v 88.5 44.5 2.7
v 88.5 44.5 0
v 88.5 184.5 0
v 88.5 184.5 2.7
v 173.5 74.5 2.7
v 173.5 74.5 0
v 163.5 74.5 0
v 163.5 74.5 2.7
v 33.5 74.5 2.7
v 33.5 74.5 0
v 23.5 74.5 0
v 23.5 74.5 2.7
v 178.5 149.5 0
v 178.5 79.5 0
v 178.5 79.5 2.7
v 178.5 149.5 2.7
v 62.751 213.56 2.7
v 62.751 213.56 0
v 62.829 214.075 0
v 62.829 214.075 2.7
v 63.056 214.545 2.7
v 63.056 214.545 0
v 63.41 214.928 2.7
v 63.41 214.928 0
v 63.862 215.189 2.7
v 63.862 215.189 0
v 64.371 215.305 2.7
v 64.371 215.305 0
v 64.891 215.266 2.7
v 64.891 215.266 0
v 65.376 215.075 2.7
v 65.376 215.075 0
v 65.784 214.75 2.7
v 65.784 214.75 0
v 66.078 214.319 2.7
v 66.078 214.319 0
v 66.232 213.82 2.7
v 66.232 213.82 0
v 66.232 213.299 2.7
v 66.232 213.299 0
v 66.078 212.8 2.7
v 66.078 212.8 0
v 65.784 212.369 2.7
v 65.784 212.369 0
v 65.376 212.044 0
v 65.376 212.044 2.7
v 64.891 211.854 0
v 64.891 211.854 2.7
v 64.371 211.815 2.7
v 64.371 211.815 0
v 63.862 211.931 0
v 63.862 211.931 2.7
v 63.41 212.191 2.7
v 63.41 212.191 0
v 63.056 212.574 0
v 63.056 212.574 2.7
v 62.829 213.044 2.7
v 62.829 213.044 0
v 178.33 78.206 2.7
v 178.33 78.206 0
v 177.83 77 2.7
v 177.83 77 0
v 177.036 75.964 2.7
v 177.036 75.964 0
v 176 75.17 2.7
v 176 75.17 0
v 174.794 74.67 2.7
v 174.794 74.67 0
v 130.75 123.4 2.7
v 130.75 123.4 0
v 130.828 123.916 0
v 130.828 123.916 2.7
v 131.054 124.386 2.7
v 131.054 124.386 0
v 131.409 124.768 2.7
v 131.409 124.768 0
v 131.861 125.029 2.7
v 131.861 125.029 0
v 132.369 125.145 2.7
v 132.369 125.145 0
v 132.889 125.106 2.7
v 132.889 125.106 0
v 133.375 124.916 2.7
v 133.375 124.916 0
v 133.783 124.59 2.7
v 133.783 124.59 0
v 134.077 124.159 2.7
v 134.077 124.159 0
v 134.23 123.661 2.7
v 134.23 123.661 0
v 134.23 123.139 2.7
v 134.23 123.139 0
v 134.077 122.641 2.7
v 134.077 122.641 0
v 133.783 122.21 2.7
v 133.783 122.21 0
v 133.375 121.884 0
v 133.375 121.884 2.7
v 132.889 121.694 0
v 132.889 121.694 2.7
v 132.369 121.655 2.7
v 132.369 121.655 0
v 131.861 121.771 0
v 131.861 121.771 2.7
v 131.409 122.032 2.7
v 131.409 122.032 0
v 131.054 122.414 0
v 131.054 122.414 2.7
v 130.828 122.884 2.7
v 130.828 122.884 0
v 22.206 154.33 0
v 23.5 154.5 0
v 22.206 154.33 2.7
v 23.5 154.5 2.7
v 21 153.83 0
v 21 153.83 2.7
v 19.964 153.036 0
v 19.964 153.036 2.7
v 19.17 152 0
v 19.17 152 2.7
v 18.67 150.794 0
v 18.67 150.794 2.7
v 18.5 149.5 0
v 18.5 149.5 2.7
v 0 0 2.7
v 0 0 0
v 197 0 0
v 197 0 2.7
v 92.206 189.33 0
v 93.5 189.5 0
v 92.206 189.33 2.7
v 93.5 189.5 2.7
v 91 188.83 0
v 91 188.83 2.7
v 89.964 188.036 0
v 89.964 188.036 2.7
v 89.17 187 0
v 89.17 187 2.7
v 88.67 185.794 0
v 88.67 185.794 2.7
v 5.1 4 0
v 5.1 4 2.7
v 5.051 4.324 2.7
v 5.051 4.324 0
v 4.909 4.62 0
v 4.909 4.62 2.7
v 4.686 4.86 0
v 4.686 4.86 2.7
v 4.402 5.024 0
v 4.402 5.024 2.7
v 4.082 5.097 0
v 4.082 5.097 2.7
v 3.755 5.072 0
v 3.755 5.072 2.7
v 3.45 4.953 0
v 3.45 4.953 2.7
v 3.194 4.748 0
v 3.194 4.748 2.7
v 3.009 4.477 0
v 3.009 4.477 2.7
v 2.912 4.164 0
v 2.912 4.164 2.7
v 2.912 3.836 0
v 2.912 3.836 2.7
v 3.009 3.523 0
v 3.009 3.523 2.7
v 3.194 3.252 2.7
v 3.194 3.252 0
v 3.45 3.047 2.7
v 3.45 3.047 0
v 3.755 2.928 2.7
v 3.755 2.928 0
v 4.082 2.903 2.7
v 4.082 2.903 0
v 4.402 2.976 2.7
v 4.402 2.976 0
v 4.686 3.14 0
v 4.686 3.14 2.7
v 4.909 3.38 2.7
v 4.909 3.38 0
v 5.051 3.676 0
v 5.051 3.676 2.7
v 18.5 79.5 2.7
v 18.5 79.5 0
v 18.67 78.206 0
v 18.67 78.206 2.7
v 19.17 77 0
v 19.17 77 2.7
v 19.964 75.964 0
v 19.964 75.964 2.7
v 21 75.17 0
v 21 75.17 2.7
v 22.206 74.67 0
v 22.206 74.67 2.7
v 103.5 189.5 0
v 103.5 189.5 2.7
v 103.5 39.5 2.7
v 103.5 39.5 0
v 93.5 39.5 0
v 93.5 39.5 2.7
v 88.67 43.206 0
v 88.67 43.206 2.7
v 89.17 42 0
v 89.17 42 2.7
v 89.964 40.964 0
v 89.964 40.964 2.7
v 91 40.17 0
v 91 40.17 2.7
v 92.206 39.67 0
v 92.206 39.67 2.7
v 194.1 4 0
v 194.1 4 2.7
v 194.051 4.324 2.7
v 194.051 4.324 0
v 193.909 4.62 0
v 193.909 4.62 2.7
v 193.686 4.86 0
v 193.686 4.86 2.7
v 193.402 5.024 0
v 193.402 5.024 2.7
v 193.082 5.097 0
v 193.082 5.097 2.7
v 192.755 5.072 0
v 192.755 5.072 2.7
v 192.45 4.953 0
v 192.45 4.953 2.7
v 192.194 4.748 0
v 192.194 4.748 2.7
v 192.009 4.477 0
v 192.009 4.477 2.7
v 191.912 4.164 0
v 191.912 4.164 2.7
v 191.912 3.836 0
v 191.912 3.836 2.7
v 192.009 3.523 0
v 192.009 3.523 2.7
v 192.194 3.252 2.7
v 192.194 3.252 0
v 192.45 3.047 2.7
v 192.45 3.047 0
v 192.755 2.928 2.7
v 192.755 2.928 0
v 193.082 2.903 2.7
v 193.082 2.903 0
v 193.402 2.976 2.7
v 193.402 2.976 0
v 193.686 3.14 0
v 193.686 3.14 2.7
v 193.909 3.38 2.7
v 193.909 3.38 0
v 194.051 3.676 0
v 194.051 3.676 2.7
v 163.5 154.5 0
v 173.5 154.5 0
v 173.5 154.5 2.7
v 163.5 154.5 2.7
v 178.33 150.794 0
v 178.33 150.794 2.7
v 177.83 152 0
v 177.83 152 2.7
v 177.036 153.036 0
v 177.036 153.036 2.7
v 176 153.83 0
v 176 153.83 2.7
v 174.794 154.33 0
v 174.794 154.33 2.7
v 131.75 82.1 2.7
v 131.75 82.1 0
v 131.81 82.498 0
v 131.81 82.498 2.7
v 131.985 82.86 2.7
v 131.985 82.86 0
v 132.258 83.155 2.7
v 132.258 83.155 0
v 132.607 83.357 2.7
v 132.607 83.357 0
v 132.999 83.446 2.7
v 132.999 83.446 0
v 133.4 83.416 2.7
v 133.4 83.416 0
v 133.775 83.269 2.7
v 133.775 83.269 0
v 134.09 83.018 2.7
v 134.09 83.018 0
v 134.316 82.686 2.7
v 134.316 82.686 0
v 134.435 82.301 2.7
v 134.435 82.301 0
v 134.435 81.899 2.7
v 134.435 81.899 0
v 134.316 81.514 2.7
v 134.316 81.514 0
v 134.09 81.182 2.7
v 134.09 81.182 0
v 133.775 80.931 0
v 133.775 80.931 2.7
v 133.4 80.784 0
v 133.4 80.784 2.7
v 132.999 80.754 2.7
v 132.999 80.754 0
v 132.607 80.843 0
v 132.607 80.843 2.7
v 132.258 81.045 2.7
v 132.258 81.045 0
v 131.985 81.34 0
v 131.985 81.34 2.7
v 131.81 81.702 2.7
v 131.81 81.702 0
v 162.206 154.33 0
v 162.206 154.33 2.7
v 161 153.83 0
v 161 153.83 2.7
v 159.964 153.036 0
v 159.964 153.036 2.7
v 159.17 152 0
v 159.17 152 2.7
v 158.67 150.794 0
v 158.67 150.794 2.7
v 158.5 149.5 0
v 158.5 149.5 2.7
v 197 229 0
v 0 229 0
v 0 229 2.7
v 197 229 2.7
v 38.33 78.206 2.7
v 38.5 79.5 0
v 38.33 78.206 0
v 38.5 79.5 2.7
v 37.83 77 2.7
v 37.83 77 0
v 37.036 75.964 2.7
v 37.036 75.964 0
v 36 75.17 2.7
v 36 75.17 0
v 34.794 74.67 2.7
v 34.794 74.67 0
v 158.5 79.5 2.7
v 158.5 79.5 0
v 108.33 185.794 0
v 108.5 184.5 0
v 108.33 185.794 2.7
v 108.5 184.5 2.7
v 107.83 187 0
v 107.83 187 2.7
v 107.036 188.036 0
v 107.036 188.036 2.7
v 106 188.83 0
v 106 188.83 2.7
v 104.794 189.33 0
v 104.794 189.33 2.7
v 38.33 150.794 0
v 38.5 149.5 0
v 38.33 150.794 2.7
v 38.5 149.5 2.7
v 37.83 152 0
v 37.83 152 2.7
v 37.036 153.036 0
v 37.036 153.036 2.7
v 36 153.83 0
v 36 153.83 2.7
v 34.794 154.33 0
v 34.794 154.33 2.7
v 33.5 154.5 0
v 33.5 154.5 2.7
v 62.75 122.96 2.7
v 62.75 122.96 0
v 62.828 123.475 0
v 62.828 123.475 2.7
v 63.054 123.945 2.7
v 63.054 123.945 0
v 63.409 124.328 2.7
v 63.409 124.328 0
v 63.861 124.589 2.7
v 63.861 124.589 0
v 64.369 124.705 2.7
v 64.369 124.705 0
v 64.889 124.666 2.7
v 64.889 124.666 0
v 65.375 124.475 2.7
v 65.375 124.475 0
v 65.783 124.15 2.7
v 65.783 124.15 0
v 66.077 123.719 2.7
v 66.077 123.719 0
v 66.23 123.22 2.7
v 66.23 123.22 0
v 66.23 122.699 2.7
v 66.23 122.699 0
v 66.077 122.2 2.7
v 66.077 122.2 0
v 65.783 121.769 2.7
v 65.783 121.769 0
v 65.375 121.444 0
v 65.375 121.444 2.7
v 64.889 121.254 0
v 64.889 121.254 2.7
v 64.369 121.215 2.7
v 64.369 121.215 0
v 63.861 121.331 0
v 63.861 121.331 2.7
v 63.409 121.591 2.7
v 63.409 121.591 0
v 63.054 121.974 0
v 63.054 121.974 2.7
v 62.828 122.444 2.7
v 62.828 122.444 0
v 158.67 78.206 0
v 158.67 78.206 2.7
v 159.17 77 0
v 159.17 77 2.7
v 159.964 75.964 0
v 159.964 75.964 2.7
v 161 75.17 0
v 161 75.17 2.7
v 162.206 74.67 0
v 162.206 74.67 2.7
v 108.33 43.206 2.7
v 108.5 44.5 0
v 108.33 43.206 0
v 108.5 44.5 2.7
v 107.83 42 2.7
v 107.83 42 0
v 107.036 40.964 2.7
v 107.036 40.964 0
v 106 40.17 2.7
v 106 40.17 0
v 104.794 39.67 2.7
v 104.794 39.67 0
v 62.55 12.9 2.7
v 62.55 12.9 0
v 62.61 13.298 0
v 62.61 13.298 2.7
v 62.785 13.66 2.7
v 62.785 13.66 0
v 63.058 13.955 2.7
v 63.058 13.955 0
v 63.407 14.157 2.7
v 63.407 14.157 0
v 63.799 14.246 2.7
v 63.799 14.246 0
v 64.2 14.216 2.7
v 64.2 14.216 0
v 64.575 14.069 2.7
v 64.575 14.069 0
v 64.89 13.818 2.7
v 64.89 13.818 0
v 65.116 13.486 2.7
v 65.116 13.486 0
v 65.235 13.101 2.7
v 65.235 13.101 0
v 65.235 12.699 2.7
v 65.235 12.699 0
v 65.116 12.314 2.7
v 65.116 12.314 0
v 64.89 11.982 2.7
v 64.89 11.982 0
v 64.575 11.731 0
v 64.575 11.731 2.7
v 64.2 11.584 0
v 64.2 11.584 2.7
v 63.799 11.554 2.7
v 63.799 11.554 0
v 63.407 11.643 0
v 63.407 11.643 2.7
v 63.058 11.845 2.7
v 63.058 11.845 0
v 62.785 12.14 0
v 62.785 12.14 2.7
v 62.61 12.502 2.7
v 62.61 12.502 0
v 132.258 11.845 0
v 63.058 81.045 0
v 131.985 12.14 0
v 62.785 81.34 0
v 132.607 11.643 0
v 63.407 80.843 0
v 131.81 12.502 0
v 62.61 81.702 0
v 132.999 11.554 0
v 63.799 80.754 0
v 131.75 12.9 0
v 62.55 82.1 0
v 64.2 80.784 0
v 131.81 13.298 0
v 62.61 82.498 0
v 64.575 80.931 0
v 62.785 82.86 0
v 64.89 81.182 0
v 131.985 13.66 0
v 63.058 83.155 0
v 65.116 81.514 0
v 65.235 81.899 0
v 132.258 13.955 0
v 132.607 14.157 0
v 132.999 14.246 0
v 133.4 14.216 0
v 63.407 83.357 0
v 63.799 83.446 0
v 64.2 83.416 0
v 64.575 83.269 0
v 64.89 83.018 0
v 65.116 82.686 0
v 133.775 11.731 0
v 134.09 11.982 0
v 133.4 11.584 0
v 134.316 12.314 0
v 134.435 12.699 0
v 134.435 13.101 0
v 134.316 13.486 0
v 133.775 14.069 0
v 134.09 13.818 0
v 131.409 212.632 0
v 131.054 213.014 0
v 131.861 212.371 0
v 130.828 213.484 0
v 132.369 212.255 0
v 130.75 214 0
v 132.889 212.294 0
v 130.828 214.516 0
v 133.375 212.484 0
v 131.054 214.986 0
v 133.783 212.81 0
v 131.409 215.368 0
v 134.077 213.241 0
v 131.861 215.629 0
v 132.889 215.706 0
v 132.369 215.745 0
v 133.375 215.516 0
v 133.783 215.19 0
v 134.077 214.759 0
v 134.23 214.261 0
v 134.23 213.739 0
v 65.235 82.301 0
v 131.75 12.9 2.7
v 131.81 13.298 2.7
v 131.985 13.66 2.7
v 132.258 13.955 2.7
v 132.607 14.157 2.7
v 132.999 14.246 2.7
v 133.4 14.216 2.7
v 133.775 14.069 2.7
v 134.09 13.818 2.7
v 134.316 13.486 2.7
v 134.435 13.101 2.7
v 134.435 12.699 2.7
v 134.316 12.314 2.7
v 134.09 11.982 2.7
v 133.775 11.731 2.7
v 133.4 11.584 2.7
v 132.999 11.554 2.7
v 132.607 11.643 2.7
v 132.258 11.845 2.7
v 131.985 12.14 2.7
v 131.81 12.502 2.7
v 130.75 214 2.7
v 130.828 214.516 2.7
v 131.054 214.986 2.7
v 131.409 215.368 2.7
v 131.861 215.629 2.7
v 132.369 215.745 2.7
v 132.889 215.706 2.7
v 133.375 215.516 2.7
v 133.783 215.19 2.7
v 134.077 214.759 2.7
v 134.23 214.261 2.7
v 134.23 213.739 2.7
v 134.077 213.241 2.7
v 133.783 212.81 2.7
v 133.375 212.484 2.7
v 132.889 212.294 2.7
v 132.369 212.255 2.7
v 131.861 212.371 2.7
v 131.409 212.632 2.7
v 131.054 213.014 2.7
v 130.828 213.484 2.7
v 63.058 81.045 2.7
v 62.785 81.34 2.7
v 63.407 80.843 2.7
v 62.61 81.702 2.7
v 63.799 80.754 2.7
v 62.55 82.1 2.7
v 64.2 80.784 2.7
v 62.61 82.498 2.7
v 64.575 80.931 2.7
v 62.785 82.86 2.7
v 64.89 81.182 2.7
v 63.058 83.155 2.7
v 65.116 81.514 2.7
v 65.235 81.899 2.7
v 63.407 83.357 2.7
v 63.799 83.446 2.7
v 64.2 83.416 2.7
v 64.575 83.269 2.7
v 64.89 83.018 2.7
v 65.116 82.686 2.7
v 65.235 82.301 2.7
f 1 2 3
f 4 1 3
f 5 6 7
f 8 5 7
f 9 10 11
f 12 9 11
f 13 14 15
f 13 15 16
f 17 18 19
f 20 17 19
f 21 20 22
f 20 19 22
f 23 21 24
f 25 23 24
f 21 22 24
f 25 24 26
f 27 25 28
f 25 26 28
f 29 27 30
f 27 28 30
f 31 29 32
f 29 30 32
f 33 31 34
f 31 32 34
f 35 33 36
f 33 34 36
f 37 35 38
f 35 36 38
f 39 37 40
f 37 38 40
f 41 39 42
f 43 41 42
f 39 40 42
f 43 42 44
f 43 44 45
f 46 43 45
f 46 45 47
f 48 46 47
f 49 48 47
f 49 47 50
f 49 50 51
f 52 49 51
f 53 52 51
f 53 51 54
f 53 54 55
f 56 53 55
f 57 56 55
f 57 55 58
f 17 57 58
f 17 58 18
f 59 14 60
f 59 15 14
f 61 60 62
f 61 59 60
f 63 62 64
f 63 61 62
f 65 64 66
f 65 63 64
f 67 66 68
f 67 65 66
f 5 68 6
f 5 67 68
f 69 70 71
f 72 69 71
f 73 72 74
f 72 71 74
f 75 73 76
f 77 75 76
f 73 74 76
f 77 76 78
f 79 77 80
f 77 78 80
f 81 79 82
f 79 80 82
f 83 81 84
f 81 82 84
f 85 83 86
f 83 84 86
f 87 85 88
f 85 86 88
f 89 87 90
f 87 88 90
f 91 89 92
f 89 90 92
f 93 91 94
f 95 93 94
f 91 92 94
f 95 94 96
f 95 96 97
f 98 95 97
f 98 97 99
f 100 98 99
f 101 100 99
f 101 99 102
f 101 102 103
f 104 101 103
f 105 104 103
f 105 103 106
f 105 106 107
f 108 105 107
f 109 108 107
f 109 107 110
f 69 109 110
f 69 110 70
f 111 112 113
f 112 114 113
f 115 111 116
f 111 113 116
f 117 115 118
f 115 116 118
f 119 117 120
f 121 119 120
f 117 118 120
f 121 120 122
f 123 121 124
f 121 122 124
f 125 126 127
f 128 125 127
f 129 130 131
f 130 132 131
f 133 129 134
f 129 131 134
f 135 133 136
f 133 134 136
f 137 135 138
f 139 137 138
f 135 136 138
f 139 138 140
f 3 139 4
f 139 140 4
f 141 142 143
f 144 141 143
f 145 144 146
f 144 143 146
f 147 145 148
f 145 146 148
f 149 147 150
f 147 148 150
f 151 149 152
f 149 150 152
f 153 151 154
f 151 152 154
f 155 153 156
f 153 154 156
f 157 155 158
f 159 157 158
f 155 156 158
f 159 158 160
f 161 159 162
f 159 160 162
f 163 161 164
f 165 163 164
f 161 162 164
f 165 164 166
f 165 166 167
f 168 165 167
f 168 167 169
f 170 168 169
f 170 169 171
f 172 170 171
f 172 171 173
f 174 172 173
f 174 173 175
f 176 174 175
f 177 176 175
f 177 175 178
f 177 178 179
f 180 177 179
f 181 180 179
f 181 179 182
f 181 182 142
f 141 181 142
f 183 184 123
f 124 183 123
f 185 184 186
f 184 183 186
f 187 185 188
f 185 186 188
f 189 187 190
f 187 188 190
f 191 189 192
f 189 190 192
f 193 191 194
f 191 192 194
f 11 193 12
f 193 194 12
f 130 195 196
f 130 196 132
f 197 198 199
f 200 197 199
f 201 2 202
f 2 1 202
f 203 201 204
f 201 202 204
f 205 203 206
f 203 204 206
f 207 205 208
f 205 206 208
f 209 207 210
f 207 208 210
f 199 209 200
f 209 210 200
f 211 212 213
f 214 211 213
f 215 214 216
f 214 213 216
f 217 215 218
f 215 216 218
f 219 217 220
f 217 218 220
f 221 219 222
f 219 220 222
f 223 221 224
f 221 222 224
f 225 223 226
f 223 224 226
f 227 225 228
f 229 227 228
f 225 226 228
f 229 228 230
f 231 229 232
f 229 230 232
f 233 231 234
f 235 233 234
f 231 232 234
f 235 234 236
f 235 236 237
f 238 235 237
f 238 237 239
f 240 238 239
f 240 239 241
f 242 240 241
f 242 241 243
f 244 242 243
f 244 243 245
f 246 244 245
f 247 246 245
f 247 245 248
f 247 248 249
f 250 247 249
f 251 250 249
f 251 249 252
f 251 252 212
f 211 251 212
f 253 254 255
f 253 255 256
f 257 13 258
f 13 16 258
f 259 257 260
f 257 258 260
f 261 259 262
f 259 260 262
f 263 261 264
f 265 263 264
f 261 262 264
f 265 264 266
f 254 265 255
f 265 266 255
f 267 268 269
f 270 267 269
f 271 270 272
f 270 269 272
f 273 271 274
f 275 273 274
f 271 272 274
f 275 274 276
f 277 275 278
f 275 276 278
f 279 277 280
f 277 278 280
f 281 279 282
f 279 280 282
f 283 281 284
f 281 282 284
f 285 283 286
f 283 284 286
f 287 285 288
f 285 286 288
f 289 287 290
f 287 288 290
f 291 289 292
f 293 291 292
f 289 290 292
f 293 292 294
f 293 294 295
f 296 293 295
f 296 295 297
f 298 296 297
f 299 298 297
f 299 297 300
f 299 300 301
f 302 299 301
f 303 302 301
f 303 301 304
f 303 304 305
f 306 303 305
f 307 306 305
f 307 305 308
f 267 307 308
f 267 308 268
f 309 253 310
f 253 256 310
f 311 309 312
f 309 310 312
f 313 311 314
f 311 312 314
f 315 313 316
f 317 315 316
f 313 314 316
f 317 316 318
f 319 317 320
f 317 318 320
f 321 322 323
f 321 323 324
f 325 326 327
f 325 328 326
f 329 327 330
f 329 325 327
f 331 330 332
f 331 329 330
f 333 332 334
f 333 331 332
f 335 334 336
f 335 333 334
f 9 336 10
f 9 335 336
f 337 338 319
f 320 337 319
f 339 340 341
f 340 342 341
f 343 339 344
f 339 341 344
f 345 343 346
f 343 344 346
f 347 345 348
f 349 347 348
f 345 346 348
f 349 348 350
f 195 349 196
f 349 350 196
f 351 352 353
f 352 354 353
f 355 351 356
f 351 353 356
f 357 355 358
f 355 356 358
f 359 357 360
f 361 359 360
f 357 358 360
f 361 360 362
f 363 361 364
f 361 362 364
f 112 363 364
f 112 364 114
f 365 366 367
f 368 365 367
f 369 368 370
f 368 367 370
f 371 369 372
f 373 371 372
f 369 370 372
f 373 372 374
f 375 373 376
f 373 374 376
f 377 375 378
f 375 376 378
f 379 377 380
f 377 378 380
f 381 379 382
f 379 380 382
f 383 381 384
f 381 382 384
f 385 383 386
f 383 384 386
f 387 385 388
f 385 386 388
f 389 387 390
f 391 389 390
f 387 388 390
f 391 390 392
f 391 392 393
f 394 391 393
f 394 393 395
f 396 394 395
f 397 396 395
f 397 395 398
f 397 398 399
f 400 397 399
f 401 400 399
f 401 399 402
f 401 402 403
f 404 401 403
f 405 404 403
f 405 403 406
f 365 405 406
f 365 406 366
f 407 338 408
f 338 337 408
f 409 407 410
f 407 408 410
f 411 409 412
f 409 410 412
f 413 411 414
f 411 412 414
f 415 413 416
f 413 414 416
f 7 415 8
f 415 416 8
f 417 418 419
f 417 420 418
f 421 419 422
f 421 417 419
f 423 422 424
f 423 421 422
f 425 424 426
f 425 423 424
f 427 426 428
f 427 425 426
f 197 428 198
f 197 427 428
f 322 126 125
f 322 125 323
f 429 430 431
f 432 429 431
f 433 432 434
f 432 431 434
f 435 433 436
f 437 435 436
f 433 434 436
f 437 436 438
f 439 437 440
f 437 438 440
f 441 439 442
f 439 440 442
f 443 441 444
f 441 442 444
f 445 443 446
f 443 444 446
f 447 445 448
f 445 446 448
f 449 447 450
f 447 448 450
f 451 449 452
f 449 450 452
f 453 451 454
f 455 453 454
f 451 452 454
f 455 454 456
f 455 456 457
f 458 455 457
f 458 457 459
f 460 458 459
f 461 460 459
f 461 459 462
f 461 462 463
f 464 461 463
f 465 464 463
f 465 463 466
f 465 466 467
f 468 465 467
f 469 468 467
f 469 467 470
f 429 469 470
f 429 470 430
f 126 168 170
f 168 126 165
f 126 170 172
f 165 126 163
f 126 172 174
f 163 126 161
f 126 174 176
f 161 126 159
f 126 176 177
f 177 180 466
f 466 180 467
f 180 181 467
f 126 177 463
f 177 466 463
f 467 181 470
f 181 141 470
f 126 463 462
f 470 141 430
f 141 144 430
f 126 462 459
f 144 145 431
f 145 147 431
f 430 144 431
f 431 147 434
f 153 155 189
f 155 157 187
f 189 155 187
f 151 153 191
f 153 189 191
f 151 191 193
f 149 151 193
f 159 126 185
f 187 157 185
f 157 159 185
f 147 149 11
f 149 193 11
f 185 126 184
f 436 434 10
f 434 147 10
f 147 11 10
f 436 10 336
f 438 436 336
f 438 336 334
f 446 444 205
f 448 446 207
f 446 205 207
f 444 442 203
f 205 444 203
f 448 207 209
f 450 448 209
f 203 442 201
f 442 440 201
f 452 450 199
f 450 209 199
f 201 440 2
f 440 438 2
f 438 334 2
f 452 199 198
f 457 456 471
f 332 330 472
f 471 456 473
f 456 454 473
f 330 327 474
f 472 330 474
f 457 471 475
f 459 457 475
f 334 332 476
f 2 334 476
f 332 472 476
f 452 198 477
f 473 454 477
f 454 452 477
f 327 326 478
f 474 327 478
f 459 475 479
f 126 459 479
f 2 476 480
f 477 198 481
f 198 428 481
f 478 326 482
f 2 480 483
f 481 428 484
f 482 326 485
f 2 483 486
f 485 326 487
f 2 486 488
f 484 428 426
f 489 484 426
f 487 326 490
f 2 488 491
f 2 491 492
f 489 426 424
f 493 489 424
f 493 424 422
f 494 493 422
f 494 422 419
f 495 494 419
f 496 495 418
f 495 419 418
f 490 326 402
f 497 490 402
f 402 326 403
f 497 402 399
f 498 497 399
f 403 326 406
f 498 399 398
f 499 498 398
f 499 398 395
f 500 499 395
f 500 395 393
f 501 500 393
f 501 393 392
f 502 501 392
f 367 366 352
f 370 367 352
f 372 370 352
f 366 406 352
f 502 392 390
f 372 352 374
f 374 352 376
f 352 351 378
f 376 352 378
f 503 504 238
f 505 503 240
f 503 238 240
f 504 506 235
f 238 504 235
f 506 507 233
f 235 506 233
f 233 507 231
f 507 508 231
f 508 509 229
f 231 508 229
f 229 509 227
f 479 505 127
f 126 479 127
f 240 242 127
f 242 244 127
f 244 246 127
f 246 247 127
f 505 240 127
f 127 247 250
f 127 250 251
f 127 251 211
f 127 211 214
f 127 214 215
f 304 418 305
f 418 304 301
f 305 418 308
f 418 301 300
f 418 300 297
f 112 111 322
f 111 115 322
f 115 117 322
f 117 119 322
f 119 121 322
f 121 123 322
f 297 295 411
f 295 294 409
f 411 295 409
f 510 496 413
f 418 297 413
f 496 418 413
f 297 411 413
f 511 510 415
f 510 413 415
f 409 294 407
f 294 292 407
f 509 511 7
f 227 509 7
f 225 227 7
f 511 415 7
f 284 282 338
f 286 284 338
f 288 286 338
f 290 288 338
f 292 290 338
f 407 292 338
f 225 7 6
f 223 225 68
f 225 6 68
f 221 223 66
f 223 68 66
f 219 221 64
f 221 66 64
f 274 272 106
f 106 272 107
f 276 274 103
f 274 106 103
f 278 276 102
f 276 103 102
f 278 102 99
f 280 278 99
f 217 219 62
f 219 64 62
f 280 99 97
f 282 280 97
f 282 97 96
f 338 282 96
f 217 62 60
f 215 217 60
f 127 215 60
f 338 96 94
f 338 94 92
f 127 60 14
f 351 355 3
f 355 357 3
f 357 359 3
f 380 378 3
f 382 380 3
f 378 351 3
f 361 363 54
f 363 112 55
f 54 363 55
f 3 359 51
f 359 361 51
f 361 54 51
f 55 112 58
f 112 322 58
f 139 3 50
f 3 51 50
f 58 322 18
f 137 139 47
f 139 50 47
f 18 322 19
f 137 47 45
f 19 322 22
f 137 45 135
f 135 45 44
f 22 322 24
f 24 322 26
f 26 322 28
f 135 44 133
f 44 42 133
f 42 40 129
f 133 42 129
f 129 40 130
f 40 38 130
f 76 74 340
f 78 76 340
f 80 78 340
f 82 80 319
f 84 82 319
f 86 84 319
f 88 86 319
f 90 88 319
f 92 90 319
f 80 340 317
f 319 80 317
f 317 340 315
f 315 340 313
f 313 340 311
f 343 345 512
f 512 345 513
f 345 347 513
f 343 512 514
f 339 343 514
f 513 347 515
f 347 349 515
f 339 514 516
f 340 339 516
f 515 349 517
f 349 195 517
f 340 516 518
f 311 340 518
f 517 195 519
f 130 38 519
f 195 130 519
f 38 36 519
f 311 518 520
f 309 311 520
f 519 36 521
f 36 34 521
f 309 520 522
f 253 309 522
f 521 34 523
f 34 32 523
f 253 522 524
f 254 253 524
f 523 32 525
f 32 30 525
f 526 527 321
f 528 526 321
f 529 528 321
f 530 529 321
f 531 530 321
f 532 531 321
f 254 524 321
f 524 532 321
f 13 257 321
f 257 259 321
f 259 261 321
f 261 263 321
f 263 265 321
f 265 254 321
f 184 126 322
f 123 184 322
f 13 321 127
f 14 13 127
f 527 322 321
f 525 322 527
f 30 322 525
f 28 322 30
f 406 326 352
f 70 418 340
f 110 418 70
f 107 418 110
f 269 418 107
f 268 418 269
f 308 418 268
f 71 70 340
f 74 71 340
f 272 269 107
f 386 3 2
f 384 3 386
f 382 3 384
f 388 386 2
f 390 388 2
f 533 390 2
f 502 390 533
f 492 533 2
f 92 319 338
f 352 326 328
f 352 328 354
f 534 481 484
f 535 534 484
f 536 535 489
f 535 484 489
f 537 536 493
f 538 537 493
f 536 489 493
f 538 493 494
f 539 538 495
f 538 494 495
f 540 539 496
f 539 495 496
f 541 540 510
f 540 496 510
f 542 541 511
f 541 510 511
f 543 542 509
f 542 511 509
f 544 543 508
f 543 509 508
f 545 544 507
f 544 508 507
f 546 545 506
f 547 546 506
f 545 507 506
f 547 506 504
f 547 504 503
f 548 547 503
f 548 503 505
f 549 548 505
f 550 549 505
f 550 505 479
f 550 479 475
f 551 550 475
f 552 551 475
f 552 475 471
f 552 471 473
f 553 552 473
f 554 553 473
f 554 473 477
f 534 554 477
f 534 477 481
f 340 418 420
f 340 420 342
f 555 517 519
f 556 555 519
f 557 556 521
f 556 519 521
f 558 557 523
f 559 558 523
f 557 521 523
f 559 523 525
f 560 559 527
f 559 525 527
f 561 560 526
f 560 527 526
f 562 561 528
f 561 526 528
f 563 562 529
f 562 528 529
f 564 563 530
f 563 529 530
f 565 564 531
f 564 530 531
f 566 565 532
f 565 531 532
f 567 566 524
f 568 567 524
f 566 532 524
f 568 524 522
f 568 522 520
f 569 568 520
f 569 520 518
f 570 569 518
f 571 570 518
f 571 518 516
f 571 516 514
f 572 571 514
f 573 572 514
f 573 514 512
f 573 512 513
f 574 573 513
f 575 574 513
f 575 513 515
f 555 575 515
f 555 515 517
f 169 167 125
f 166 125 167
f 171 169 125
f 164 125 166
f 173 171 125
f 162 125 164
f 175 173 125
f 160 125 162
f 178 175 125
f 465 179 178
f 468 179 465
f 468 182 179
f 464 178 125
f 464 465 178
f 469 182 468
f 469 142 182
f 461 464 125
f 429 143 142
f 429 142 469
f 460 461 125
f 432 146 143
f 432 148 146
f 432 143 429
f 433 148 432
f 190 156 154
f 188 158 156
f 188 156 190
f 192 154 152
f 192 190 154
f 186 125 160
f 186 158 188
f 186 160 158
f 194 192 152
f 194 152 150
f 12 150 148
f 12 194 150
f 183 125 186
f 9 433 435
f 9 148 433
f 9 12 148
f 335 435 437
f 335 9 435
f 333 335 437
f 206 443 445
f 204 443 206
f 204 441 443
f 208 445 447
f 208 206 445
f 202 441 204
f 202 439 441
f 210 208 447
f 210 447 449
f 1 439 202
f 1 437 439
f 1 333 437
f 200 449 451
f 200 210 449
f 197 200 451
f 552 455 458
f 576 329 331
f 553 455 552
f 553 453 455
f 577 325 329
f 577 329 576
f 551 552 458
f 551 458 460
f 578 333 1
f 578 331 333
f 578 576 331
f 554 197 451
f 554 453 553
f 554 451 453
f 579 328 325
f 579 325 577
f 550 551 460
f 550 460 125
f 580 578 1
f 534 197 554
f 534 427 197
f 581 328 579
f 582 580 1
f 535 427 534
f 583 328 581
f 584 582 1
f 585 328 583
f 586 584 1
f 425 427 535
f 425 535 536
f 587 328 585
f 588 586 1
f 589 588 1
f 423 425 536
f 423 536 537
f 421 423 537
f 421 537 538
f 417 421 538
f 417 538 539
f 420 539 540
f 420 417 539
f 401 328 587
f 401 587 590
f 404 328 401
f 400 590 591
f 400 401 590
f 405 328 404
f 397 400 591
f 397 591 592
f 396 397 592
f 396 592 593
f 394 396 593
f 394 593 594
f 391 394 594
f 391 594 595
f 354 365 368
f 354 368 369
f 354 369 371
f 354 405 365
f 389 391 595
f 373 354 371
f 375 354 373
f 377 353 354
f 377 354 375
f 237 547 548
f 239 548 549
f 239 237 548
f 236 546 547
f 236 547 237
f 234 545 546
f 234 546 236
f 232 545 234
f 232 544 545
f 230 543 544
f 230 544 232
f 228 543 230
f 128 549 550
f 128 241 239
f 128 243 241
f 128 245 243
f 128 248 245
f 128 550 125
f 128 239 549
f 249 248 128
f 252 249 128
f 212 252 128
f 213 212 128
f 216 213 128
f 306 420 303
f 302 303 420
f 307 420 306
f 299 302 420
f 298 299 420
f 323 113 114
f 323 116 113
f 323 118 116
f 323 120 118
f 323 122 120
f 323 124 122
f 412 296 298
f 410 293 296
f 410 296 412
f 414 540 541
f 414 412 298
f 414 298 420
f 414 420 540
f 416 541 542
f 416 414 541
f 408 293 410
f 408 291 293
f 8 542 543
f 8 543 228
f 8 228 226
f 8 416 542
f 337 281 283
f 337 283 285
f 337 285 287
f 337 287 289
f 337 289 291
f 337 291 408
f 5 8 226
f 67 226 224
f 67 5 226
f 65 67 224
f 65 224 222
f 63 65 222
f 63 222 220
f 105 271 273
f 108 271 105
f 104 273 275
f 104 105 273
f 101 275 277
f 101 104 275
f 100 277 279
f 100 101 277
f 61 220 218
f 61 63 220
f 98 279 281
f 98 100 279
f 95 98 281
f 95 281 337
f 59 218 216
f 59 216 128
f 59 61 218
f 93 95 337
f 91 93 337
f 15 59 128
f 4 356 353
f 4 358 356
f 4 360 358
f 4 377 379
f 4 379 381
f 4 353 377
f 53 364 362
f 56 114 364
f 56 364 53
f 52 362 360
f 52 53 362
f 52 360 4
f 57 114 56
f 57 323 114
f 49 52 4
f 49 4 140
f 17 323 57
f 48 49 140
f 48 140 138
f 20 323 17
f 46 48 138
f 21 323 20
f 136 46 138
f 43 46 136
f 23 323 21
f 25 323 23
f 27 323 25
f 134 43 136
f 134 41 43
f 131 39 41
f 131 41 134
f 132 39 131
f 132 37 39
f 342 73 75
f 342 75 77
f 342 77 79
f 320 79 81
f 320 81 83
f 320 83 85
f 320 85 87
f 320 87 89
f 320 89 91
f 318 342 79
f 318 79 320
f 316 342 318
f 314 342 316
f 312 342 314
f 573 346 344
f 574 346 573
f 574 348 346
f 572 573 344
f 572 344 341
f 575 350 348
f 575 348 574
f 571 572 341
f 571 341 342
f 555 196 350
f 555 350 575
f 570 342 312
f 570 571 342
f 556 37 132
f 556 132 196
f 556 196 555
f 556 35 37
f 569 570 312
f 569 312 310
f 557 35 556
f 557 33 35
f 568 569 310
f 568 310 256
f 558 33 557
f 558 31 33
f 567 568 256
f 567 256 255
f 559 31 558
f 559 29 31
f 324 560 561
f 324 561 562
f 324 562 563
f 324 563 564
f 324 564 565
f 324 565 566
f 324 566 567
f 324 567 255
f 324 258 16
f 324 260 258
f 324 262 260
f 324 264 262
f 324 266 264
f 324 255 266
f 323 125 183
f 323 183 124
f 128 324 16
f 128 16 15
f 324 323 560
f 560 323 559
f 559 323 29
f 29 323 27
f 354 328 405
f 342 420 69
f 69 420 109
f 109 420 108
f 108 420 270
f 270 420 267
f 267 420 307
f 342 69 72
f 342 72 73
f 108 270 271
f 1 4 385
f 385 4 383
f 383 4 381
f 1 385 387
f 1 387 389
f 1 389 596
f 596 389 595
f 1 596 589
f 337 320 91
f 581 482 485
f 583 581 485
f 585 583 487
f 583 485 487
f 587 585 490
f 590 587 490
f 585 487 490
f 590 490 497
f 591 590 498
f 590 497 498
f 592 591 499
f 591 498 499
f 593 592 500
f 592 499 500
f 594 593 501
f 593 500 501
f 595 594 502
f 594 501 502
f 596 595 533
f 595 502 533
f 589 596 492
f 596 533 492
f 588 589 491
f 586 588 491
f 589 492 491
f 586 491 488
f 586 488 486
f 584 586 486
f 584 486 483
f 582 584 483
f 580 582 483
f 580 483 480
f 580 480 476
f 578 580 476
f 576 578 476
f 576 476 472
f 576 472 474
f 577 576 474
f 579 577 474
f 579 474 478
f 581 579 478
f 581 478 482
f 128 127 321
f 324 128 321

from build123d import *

# Parameters (mm, degrees)
SKETCH_1_W          = 197
SKETCH_1_H          = 229
EXTRUDE_1_DEPTH     = 2.7
SKETCH_2_R          = 1.1
CUT_EXTRUDE_1_DEPTH = 2.85
SKETCH_3_R          = 1.35
CUT_EXTRUDE_2_DEPTH = 9
SKETCH_5_R          = 1.75
CUT_EXTRUDE_3_DEPTH = 10
SKETCH_6_W          = 20
SKETCH_6_H          = 80
SKETCH_6_H_2        = 150
CUT_EXTRUDE_4_DEPTH = 10
FILLET_1_R          = 5


with BuildPart() as part:
    # 草图1 → 凸台-拉伸1 (new body)
    with BuildSketch(Plane.XY):
        with Locations((98.5, 114.5)):
            Rectangle(SKETCH_1_W, SKETCH_1_H)
    extrude(amount=EXTRUDE_1_DEPTH)

    # 草图2 → 切除-拉伸1 (cut)
    with BuildSketch(Plane.XY.offset(2.7)):
        with Locations((4, 4)):
            Circle(SKETCH_2_R)
        with Locations((193, 4)):
            Circle(SKETCH_2_R)
    extrude(amount=-CUT_EXTRUDE_1_DEPTH, mode=Mode.SUBTRACT)

    # 草图3 → 切除-拉伸2 (cut)
    with BuildSketch(Plane(origin=(0, 0, 0), x_dir=(-1, 0, 0), z_dir=(0, 0, -1))):
        with Locations((-133.1, 12.9)):
            Circle(SKETCH_3_R)
        with Locations((-133.1, 82.1)):
            Circle(SKETCH_3_R)
        with Locations((-63.9, 82.1)):
            Circle(SKETCH_3_R)
        with Locations((-63.9, 12.9)):
            Circle(SKETCH_3_R)
    extrude(amount=-CUT_EXTRUDE_2_DEPTH, mode=Mode.SUBTRACT)

    # 草图5 → 切除-拉伸3 (cut)
    with BuildSketch(Plane(origin=(0, 0, 0), x_dir=(-1, 0, 0), z_dir=(0, 0, -1))):
        with Locations((-132.5, 214)):
            Circle(SKETCH_5_R)
        with Locations((-64.501425834, 213.559646274)):
            Circle(SKETCH_5_R)
        with Locations((-132.5, 123.4)):
            Circle(SKETCH_5_R)
        with Locations((-64.5, 122.959646285)):
            Circle(SKETCH_5_R)
    extrude(amount=-CUT_EXTRUDE_3_DEPTH, mode=Mode.SUBTRACT)

    # 草图6 → 切除-拉伸4 (cut)
    with BuildSketch(Plane(origin=(0, 0, 0), x_dir=(-1, 0, 0), z_dir=(0, 0, -1))):
        with Locations((-168.5, 114.5)):
            Rectangle(SKETCH_6_W, SKETCH_6_H)
        with Locations((-28.5, 114.5)):
            Rectangle(SKETCH_6_W, SKETCH_6_H)
        with Locations((-98.5, 114.5)):
            Rectangle(SKETCH_6_W, SKETCH_6_H_2)
    extrude(amount=-CUT_EXTRUDE_4_DEPTH, mode=Mode.SUBTRACT)

    # 圆角1
    fillet_1_edges = [part.edges().sort_by_distance(p)[0] for p in [
        (178.5, 74.5, 1.35),
        (178.5, 154.5, 1.35),
        (158.5, 154.5, 1.35),
        (158.5, 74.5, 1.35),
        (38.5, 74.5, 1.35),
        (38.5, 154.5, 1.35),
        (18.5, 154.5, 1.35),
        (18.5, 74.5, 1.35),
        (108.5, 39.5, 1.35),
        (108.5, 189.5, 1.35),
        (88.5, 189.5, 1.35),
        (88.5, 39.5, 1.35),
    ]]
    fillet(fillet_1_edges, radius=FILLET_1_R)


solid = part.part
